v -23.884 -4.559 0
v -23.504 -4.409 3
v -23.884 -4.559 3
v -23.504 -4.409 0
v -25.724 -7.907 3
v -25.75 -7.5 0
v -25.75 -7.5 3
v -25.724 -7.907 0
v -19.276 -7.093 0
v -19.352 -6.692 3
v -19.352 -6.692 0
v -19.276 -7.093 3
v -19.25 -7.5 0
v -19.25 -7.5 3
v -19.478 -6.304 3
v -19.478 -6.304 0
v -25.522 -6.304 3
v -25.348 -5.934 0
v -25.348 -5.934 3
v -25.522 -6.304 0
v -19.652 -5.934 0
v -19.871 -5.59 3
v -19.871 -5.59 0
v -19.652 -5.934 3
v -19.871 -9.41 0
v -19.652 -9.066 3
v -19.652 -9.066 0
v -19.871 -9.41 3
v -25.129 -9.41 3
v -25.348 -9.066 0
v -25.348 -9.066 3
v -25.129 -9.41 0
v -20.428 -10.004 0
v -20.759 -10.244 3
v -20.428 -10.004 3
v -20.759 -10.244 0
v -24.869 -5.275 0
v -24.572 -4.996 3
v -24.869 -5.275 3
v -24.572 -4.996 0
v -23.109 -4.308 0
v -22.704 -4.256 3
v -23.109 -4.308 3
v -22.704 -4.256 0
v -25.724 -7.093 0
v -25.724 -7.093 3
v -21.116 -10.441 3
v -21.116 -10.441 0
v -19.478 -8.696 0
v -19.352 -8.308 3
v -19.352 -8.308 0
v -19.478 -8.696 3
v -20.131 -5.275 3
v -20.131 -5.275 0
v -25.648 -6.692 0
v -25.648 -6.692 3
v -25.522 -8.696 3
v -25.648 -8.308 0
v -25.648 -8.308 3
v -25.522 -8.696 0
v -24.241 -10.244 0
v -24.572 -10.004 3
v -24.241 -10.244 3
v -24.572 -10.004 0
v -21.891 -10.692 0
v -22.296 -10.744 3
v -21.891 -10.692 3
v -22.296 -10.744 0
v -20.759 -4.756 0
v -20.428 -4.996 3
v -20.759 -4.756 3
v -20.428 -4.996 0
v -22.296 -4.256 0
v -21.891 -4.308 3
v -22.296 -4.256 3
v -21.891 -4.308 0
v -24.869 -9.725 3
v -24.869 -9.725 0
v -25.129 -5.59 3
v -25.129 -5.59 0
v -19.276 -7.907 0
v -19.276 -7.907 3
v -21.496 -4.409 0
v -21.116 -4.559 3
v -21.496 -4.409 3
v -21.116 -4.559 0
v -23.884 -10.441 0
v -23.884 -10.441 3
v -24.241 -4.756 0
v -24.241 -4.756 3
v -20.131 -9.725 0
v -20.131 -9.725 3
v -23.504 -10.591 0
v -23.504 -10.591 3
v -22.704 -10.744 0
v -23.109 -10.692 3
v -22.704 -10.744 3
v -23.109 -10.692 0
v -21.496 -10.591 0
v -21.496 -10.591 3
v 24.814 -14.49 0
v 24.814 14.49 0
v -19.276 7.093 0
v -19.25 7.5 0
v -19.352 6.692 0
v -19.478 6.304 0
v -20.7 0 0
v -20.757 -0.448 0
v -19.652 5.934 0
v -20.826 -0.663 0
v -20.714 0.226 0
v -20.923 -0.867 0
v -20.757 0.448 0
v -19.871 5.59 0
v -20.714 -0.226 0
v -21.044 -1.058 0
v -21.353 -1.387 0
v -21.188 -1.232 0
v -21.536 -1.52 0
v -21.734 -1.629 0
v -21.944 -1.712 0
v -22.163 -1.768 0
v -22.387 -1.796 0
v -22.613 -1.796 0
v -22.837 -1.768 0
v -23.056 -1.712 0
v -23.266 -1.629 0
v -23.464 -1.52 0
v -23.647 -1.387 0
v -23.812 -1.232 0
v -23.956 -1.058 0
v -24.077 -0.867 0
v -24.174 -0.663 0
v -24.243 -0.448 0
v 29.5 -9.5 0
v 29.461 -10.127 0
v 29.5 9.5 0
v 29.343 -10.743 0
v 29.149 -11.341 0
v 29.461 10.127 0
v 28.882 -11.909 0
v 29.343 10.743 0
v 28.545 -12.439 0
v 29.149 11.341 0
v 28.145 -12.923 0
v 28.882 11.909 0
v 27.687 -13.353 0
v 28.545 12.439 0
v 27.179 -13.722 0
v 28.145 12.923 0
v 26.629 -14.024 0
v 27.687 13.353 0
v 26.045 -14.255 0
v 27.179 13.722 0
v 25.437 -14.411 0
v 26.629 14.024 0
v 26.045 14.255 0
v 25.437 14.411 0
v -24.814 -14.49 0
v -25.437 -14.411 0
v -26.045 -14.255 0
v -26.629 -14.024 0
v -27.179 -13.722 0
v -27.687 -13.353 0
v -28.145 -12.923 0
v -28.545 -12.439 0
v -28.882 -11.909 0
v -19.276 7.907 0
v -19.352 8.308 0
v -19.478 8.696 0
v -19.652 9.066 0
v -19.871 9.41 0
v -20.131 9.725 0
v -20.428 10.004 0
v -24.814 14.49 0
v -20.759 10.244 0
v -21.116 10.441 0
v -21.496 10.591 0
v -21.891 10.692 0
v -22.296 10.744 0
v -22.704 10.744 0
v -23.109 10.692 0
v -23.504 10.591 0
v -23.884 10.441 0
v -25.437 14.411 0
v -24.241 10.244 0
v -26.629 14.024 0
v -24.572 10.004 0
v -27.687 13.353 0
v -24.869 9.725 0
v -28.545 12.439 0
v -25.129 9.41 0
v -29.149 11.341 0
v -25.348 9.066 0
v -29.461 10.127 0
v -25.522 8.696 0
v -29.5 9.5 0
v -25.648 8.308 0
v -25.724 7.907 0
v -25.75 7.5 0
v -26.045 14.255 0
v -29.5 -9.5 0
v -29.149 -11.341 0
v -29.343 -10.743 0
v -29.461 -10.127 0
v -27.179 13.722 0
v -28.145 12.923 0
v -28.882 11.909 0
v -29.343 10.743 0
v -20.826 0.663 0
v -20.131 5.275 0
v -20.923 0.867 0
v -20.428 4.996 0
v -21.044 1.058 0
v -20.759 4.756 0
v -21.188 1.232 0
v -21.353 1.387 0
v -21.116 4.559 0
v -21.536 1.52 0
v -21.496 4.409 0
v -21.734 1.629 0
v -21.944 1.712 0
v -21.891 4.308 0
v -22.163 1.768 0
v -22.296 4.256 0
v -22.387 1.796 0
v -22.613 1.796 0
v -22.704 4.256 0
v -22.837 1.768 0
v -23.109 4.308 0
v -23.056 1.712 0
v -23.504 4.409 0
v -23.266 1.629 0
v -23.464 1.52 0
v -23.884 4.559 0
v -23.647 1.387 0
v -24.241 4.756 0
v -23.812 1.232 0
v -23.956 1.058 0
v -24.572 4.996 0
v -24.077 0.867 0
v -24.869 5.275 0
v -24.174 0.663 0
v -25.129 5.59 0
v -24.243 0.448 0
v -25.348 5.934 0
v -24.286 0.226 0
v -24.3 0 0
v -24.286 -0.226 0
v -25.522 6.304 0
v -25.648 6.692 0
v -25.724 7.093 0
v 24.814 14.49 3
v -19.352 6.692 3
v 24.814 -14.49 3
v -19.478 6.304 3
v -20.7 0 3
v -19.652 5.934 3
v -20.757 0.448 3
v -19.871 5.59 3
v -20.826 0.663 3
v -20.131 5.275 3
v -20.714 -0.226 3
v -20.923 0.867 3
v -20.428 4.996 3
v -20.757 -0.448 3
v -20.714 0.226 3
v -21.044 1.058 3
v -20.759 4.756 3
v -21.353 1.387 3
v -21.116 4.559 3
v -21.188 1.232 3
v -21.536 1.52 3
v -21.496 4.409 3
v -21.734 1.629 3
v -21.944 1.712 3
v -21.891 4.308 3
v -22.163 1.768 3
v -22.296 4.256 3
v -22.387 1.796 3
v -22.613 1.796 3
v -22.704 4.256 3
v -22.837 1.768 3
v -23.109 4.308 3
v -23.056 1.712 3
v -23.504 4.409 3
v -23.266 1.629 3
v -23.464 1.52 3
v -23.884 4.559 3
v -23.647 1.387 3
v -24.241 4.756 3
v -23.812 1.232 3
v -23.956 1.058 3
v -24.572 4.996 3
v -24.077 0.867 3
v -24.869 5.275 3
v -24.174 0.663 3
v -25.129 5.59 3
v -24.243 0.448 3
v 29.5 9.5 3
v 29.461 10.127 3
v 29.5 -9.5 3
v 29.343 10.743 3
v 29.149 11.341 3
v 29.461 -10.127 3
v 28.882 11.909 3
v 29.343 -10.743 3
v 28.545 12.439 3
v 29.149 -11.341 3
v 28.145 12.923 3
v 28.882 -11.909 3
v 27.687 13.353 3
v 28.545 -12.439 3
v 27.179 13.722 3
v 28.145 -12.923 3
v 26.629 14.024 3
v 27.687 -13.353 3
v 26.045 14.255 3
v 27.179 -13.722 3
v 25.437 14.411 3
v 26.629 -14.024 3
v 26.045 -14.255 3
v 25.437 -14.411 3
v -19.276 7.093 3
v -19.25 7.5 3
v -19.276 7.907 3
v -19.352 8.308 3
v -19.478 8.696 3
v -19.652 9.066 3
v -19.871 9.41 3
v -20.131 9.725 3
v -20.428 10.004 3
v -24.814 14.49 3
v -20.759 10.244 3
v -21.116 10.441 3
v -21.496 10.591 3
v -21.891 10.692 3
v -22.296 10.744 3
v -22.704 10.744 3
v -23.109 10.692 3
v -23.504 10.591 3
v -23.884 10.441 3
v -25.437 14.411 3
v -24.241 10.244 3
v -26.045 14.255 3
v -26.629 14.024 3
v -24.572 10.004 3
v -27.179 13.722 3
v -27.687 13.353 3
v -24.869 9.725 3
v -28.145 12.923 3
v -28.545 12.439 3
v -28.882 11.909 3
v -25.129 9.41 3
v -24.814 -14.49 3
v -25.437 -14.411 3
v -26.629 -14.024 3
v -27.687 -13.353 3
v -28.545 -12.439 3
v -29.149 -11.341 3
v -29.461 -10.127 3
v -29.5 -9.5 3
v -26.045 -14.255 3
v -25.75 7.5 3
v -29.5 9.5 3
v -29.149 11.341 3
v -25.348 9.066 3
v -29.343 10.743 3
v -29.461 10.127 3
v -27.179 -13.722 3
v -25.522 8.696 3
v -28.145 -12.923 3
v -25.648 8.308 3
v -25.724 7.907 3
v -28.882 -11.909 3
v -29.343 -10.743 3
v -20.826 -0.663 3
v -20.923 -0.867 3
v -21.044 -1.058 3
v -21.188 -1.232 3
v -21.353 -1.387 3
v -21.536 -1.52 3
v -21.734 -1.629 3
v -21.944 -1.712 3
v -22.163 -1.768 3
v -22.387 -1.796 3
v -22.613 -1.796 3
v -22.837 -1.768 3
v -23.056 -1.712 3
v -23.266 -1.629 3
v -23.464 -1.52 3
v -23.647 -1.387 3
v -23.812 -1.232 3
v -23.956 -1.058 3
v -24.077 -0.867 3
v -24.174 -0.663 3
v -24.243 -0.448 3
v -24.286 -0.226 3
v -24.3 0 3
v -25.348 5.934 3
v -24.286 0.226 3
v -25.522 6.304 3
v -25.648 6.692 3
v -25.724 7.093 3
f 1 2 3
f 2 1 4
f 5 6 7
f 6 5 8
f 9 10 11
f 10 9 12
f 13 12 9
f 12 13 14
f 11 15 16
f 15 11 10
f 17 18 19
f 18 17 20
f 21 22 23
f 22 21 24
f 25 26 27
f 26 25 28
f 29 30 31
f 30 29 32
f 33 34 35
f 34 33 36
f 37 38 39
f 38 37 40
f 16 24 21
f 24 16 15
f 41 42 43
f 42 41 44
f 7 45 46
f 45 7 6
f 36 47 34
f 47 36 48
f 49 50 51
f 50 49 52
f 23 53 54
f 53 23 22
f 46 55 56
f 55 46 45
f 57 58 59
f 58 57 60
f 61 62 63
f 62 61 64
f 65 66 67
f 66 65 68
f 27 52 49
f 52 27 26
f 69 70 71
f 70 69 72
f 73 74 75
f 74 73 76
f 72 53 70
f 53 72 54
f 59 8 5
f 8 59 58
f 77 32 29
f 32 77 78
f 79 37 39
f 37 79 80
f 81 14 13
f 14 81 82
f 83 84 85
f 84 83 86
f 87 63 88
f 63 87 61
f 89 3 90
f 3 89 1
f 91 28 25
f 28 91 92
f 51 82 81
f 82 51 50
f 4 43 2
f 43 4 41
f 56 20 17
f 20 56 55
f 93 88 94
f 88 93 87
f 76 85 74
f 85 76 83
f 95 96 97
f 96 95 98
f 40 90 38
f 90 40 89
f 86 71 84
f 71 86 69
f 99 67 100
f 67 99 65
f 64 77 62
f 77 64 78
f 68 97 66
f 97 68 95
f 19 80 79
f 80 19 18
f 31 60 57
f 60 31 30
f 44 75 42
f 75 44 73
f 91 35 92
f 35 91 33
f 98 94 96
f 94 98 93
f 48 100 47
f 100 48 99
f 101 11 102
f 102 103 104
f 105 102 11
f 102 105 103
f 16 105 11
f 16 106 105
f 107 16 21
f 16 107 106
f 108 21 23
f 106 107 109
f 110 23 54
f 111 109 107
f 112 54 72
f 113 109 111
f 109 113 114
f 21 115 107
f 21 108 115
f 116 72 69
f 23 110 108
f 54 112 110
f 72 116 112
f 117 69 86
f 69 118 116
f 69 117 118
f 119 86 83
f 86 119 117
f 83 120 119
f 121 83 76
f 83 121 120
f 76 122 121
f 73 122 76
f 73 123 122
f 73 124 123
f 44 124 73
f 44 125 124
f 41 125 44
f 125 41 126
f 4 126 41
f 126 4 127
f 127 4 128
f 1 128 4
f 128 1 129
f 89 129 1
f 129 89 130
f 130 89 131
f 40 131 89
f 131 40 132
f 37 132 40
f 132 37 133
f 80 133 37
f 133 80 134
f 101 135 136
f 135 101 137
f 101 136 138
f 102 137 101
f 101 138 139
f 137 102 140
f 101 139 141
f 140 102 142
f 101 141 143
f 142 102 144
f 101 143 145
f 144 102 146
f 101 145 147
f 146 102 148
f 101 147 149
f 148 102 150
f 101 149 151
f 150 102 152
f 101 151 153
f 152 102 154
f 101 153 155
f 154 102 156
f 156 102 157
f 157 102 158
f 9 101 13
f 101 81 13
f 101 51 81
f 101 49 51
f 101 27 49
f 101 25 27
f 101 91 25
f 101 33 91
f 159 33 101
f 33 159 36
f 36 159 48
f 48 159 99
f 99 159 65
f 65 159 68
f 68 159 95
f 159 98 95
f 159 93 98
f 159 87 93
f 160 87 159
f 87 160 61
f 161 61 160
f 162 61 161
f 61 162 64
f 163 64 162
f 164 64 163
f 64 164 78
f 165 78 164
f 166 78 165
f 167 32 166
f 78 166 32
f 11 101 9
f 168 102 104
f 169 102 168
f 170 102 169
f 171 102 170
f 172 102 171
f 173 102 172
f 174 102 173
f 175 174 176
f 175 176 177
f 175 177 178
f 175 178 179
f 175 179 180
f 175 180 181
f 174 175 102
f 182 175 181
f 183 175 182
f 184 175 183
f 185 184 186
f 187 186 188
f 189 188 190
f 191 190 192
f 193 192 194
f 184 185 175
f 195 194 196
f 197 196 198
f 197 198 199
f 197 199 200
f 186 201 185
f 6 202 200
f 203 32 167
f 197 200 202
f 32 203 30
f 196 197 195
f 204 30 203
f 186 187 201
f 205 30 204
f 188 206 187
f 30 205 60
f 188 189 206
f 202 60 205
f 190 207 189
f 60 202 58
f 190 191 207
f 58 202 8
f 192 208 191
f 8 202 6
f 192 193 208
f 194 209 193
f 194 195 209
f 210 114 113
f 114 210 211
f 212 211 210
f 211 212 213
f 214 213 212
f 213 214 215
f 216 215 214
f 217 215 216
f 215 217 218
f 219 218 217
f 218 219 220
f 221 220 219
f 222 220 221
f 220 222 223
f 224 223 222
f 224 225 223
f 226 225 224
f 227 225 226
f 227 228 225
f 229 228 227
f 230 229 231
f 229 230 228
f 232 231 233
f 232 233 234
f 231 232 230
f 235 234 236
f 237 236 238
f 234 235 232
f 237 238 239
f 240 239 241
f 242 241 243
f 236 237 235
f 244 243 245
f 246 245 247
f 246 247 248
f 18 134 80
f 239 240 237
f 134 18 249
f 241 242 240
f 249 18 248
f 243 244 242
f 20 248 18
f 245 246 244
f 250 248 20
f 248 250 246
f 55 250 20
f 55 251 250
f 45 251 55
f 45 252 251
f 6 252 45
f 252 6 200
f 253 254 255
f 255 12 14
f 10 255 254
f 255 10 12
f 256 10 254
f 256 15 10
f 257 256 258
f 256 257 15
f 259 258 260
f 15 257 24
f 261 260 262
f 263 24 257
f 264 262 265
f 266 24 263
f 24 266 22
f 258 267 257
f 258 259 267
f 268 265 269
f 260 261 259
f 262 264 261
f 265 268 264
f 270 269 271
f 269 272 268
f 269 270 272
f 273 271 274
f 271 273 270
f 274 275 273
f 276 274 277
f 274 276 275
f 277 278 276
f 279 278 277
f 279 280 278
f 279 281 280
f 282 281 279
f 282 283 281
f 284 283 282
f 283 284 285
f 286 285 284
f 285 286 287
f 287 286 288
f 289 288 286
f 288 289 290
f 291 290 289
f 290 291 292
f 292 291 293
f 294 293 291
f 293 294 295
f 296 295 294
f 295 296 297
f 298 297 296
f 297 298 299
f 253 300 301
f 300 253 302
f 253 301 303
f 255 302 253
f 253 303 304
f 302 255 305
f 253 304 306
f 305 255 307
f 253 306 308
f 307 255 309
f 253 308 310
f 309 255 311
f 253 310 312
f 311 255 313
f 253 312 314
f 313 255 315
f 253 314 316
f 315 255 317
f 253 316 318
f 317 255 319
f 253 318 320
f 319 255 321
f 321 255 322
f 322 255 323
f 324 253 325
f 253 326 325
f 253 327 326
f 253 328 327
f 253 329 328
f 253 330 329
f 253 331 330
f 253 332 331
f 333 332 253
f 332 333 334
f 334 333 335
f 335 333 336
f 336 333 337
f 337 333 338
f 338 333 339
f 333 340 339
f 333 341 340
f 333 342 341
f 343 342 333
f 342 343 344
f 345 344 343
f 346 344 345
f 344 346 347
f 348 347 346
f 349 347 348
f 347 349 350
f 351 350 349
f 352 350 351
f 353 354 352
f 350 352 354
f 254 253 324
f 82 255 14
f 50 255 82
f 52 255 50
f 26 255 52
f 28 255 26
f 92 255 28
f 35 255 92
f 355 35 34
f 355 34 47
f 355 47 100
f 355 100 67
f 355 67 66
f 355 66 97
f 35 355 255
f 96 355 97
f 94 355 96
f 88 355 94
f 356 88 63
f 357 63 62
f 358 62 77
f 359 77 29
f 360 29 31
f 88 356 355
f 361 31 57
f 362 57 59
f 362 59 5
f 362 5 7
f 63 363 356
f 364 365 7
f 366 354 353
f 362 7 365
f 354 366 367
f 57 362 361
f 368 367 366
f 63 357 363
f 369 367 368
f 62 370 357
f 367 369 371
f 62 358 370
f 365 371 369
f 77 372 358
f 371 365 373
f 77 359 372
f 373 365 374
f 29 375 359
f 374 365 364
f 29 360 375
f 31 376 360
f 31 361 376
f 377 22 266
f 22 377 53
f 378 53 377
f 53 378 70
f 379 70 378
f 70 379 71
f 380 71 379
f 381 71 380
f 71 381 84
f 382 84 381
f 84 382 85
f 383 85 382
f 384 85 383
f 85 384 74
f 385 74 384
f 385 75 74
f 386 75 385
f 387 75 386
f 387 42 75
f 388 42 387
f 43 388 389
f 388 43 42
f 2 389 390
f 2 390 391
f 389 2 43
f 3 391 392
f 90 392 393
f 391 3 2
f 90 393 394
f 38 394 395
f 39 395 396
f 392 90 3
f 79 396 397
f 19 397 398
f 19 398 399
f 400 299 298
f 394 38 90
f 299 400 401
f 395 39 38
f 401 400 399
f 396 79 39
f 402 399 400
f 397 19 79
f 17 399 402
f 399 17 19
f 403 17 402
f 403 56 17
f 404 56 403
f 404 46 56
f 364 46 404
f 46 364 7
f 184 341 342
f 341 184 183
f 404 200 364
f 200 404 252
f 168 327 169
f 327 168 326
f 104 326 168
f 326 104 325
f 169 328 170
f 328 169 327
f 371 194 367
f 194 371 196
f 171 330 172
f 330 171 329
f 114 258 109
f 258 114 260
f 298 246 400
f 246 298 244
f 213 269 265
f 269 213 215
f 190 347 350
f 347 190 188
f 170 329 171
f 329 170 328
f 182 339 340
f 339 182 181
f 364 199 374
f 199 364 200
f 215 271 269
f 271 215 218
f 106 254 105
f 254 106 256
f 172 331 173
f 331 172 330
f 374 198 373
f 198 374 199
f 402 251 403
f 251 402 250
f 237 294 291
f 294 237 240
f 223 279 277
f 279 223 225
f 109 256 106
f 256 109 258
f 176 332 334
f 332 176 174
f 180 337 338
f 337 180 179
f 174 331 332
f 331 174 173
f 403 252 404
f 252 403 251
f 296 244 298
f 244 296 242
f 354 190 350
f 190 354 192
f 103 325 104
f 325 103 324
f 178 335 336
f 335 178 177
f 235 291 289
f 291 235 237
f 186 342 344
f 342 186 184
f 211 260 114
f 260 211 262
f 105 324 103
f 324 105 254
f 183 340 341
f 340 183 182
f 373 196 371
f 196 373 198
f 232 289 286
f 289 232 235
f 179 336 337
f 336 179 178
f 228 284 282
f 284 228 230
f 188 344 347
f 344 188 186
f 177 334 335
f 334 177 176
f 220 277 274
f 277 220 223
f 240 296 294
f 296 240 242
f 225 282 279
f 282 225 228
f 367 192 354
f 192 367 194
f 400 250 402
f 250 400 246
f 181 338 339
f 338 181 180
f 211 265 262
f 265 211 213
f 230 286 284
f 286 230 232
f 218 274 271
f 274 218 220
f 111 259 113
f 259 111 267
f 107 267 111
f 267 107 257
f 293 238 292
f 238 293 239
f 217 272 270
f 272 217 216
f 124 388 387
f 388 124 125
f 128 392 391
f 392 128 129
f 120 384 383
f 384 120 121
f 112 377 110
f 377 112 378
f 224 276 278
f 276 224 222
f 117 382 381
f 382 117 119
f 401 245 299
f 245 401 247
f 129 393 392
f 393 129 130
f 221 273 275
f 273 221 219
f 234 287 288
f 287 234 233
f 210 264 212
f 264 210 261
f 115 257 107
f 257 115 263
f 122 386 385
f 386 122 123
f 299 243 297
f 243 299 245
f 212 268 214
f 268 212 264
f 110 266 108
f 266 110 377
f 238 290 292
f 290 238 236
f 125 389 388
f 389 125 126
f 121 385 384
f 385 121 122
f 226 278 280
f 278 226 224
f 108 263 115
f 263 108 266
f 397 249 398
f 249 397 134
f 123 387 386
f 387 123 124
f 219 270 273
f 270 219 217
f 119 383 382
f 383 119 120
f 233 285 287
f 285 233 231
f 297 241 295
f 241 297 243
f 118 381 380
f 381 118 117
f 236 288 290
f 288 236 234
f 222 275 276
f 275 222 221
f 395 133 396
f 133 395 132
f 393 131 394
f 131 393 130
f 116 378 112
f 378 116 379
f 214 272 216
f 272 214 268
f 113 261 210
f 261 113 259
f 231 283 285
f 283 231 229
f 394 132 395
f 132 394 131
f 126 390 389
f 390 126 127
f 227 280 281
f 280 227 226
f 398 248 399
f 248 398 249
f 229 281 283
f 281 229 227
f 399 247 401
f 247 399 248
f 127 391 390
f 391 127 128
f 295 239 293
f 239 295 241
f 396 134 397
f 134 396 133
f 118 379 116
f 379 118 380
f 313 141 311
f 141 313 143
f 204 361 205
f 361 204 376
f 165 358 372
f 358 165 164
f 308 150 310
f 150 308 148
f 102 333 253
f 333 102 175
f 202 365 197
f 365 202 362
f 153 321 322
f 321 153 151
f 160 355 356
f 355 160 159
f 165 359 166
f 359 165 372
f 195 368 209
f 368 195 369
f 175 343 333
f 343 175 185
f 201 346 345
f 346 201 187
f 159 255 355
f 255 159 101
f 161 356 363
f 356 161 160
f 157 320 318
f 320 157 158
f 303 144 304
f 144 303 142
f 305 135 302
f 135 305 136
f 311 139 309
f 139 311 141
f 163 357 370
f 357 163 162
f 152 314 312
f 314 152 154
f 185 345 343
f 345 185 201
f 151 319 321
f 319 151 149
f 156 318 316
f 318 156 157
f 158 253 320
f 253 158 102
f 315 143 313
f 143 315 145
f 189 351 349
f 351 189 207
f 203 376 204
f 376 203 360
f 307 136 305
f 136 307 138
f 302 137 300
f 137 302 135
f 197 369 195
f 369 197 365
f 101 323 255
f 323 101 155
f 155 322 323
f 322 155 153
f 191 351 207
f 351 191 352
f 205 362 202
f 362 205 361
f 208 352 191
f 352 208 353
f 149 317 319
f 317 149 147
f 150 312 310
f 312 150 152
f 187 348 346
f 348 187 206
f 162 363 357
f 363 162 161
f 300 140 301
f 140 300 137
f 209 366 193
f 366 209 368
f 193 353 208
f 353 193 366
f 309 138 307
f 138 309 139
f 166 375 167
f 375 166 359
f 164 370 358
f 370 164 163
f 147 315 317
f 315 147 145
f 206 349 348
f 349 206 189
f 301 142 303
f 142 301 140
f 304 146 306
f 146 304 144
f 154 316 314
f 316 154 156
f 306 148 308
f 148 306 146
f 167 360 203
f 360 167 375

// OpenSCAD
$fn = 50;


difference() {
	union() {
		hull() {
			translate(v = [-24.5000000000, 9.5000000000, 0]) {
				cylinder(h = 3, r = 5);
			}
			translate(v = [24.5000000000, 9.5000000000, 0]) {
				cylinder(h = 3, r = 5);
			}
			translate(v = [-24.5000000000, -9.5000000000, 0]) {
				cylinder(h = 3, r = 5);
			}
			translate(v = [24.5000000000, -9.5000000000, 0]) {
				cylinder(h = 3, r = 5);
			}
		}
	}
	union() {
		translate(v = [-22.5000000000, -7.5000000000, 0]) {
			cylinder(h = 3, r = 3.2500000000);
		}
		translate(v = [-22.5000000000, 7.5000000000, 0]) {
			cylinder(h = 3, r = 3.2500000000);
		}
		translate(v = [-22.5000000000, -7.5000000000, 0]) {
			cylinder(h = 3, r = 1.8000000000);
		}
		translate(v = [-22.5000000000, 0.0000000000, 0]) {
			cylinder(h = 3, r = 1.8000000000);
		}
		translate(v = [-22.5000000000, 7.5000000000, 0]) {
			cylinder(h = 3, r = 1.8000000000);
		}
		translate(v = [-22.5000000000, -7.5000000000, 0]) {
			cylinder(h = 3, r = 1.8000000000);
		}
		translate(v = [-22.5000000000, 0.0000000000, 0]) {
			cylinder(h = 3, r = 1.8000000000);
		}
		translate(v = [-22.5000000000, 7.5000000000, 0]) {
			cylinder(h = 3, r = 1.8000000000);
		}
		translate(v = [-22.5000000000, -7.5000000000, 0]) {
			cylinder(h = 3, r = 1.8000000000);
		}
		translate(v = [-22.5000000000, 0.0000000000, 0]) {
			cylinder(h = 3, r = 1.8000000000);
		}
		translate(v = [-22.5000000000, 7.5000000000, 0]) {
			cylinder(h = 3, r = 1.8000000000);
		}
	}
}
